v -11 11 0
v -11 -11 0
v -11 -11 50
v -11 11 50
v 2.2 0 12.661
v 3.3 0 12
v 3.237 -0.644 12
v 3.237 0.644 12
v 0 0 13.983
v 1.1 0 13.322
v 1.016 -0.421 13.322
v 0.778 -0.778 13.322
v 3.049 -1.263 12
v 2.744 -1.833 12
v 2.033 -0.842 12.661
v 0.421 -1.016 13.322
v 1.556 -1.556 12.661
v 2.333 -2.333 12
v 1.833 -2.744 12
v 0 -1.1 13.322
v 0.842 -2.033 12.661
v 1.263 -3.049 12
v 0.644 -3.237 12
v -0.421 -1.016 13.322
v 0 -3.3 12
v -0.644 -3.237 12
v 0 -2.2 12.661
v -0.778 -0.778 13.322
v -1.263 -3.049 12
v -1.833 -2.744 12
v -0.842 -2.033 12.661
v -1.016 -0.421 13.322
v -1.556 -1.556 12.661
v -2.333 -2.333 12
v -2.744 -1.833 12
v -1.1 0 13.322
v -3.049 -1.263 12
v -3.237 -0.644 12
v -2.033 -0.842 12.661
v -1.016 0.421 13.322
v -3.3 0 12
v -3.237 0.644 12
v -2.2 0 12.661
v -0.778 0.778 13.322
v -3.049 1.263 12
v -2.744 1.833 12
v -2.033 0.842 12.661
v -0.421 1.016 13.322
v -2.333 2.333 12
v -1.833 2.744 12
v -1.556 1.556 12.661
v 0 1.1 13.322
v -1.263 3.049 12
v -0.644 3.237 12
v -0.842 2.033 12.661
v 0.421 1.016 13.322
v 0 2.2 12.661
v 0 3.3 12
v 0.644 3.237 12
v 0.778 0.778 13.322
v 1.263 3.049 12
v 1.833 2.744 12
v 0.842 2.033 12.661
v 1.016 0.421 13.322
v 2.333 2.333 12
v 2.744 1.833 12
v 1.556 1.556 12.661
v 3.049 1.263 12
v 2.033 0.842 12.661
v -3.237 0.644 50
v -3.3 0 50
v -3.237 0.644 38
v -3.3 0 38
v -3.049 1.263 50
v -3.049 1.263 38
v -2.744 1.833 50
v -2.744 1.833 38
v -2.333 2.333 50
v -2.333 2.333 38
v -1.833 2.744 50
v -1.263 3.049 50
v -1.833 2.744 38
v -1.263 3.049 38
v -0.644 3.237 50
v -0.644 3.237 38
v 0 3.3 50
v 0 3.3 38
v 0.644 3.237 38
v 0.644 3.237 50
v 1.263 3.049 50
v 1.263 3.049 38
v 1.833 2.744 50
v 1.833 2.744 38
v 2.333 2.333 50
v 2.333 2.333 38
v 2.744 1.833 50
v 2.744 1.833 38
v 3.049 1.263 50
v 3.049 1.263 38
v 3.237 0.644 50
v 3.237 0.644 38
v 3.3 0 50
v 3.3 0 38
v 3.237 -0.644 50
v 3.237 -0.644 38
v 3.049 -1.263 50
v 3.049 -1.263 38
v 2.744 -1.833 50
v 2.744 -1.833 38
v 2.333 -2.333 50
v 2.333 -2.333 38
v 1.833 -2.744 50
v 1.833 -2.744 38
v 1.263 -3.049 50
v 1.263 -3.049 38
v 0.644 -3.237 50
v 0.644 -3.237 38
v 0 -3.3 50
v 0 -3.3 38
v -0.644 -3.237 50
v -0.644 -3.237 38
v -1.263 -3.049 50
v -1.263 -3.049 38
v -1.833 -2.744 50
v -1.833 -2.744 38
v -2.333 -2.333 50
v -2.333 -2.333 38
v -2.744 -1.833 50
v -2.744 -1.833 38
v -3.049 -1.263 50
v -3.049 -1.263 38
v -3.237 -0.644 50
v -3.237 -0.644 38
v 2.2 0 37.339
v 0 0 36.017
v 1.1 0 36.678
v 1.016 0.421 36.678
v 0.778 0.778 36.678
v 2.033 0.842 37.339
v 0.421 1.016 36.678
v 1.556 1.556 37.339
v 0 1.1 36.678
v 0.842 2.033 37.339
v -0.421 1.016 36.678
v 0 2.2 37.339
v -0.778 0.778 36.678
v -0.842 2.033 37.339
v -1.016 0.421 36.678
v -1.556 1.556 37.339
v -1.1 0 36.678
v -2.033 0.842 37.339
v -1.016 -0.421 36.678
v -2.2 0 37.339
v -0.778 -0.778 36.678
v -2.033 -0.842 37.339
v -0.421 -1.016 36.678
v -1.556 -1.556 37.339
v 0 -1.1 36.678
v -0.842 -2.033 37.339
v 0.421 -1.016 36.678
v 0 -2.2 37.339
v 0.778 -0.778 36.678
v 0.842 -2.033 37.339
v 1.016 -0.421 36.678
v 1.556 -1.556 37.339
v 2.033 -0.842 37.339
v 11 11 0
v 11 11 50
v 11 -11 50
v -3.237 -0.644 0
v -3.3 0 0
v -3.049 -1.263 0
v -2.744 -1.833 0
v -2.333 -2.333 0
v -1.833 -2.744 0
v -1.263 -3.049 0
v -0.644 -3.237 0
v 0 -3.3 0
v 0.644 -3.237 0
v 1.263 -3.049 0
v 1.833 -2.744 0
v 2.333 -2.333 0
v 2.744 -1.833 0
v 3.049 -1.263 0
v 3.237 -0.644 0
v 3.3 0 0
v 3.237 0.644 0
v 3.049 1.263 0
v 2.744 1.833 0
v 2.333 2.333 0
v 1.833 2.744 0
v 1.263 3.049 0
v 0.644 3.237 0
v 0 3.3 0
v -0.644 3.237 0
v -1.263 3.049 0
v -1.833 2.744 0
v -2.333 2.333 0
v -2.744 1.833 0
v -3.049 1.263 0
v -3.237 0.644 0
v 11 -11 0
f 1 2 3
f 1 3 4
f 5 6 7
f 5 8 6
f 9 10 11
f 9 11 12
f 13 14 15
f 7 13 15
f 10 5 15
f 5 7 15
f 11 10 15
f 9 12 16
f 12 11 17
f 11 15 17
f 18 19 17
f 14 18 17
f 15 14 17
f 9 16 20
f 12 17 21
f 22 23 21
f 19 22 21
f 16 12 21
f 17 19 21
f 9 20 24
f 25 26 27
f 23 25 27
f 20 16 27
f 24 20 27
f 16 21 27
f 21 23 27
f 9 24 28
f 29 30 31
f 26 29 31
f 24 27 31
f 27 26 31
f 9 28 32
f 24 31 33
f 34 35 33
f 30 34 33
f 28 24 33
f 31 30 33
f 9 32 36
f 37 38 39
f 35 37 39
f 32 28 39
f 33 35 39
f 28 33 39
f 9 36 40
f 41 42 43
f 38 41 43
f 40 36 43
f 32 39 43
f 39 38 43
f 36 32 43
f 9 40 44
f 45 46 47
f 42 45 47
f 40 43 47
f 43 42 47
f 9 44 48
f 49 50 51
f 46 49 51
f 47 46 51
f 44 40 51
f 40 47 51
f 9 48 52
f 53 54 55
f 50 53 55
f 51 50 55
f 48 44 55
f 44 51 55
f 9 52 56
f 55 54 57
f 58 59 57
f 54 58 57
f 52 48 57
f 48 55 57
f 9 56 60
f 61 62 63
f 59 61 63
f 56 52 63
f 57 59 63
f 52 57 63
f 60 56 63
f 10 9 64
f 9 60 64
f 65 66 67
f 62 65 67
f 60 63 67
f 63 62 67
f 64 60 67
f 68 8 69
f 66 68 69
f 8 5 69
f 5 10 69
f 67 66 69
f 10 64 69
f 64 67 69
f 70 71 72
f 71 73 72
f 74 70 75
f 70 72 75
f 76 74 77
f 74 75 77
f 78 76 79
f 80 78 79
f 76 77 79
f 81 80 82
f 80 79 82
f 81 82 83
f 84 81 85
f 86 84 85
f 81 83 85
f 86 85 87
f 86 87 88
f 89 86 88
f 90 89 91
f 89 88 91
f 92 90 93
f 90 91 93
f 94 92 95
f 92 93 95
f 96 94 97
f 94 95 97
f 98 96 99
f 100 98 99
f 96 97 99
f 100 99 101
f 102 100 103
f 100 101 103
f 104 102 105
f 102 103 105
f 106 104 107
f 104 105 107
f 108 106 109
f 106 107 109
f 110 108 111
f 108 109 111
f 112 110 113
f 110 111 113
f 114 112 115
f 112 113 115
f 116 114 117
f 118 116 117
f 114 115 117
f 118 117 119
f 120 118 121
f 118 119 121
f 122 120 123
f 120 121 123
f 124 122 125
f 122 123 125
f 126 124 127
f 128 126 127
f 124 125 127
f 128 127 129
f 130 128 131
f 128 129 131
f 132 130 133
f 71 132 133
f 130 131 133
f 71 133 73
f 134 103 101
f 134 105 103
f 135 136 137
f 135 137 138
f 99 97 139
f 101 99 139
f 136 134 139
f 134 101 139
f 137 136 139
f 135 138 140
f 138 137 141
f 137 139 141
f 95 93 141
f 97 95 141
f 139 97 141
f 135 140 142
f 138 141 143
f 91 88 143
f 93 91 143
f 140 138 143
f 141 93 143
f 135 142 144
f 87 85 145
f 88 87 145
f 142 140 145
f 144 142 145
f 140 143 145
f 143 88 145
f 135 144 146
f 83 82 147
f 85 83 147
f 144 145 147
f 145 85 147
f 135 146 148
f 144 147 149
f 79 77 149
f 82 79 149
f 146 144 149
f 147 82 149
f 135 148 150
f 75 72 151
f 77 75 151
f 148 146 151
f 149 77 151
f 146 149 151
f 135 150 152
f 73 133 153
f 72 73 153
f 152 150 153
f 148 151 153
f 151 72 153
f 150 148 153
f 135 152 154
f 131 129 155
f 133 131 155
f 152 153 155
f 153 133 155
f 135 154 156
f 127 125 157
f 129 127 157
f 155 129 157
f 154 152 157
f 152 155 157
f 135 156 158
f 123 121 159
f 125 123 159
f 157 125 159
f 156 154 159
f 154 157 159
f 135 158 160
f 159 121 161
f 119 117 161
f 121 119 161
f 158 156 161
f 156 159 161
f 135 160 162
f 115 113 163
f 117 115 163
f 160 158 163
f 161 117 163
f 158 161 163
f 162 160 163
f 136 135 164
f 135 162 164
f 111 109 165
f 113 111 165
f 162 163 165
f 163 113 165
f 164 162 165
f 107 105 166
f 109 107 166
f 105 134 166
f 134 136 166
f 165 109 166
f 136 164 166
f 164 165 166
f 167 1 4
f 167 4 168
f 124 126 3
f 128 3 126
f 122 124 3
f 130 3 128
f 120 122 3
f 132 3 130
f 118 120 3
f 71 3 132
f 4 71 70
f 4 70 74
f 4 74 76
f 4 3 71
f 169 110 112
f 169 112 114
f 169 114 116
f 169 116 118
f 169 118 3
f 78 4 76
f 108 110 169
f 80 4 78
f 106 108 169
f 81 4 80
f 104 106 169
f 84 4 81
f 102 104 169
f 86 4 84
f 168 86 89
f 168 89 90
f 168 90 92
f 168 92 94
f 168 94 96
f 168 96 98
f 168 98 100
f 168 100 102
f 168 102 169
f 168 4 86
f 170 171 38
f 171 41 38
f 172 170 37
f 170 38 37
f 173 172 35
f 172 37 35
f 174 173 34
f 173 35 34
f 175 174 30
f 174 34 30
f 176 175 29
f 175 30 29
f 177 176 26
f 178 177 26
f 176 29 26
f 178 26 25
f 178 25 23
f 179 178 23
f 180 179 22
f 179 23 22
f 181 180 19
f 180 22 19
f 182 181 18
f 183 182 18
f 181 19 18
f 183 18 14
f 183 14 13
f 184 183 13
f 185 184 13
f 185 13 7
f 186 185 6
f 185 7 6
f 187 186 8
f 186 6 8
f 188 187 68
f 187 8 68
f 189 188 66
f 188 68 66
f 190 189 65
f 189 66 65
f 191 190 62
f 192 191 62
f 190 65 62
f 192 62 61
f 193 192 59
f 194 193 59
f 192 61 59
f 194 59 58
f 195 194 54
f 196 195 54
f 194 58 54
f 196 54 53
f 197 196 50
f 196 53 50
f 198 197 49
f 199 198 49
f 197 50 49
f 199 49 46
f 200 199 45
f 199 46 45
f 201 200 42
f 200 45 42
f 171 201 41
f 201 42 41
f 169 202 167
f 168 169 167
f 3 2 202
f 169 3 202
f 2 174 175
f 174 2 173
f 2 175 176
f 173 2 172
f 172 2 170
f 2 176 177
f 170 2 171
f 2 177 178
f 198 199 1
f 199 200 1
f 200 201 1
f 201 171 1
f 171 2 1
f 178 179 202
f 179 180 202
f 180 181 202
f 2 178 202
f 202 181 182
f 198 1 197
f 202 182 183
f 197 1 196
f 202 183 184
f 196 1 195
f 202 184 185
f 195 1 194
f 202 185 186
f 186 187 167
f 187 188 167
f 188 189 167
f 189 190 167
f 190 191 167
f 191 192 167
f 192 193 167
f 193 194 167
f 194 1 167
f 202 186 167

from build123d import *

# Parameters (mm, degrees)
F0_W     = 22
F0_H     = 22
F1_DEPTH = 50
F3_D     = 6.6
F3_DEPTH = 12
F3_TIP   = 1.9828400428
F5_D     = 6.6
F5_DEPTH = 12
F5_TIP   = 1.9828400428


with BuildPart() as f1:
    # F0 (on Top) → F1 (new body)
    with BuildSketch(Plane.XY):
        Rectangle(F0_W, F0_H)
    extrude(amount=F1_DEPTH)

    # F3
    with Locations(Plane.XY.offset(50)):
        with Locations((0, 0)):
            Hole(F3_D / 2, depth=F3_DEPTH)
            with Locations((0, 0, -(F3_DEPTH + F3_TIP / 2))):  # 118° drill point
                Cone(0, F3_D / 2, F3_TIP, mode=Mode.SUBTRACT)

    # F5
    with Locations(Plane(origin=(0, 0, 0), x_dir=(1, 0, 0), z_dir=(0, 0, -1))):
        with Locations((0, 0)):
            Hole(F5_D / 2, depth=F5_DEPTH)
            with Locations((0, 0, -(F5_DEPTH + F5_TIP / 2))):  # 118° drill point
                Cone(0, F5_D / 2, F5_TIP, mode=Mode.SUBTRACT)


solid = f1.part
